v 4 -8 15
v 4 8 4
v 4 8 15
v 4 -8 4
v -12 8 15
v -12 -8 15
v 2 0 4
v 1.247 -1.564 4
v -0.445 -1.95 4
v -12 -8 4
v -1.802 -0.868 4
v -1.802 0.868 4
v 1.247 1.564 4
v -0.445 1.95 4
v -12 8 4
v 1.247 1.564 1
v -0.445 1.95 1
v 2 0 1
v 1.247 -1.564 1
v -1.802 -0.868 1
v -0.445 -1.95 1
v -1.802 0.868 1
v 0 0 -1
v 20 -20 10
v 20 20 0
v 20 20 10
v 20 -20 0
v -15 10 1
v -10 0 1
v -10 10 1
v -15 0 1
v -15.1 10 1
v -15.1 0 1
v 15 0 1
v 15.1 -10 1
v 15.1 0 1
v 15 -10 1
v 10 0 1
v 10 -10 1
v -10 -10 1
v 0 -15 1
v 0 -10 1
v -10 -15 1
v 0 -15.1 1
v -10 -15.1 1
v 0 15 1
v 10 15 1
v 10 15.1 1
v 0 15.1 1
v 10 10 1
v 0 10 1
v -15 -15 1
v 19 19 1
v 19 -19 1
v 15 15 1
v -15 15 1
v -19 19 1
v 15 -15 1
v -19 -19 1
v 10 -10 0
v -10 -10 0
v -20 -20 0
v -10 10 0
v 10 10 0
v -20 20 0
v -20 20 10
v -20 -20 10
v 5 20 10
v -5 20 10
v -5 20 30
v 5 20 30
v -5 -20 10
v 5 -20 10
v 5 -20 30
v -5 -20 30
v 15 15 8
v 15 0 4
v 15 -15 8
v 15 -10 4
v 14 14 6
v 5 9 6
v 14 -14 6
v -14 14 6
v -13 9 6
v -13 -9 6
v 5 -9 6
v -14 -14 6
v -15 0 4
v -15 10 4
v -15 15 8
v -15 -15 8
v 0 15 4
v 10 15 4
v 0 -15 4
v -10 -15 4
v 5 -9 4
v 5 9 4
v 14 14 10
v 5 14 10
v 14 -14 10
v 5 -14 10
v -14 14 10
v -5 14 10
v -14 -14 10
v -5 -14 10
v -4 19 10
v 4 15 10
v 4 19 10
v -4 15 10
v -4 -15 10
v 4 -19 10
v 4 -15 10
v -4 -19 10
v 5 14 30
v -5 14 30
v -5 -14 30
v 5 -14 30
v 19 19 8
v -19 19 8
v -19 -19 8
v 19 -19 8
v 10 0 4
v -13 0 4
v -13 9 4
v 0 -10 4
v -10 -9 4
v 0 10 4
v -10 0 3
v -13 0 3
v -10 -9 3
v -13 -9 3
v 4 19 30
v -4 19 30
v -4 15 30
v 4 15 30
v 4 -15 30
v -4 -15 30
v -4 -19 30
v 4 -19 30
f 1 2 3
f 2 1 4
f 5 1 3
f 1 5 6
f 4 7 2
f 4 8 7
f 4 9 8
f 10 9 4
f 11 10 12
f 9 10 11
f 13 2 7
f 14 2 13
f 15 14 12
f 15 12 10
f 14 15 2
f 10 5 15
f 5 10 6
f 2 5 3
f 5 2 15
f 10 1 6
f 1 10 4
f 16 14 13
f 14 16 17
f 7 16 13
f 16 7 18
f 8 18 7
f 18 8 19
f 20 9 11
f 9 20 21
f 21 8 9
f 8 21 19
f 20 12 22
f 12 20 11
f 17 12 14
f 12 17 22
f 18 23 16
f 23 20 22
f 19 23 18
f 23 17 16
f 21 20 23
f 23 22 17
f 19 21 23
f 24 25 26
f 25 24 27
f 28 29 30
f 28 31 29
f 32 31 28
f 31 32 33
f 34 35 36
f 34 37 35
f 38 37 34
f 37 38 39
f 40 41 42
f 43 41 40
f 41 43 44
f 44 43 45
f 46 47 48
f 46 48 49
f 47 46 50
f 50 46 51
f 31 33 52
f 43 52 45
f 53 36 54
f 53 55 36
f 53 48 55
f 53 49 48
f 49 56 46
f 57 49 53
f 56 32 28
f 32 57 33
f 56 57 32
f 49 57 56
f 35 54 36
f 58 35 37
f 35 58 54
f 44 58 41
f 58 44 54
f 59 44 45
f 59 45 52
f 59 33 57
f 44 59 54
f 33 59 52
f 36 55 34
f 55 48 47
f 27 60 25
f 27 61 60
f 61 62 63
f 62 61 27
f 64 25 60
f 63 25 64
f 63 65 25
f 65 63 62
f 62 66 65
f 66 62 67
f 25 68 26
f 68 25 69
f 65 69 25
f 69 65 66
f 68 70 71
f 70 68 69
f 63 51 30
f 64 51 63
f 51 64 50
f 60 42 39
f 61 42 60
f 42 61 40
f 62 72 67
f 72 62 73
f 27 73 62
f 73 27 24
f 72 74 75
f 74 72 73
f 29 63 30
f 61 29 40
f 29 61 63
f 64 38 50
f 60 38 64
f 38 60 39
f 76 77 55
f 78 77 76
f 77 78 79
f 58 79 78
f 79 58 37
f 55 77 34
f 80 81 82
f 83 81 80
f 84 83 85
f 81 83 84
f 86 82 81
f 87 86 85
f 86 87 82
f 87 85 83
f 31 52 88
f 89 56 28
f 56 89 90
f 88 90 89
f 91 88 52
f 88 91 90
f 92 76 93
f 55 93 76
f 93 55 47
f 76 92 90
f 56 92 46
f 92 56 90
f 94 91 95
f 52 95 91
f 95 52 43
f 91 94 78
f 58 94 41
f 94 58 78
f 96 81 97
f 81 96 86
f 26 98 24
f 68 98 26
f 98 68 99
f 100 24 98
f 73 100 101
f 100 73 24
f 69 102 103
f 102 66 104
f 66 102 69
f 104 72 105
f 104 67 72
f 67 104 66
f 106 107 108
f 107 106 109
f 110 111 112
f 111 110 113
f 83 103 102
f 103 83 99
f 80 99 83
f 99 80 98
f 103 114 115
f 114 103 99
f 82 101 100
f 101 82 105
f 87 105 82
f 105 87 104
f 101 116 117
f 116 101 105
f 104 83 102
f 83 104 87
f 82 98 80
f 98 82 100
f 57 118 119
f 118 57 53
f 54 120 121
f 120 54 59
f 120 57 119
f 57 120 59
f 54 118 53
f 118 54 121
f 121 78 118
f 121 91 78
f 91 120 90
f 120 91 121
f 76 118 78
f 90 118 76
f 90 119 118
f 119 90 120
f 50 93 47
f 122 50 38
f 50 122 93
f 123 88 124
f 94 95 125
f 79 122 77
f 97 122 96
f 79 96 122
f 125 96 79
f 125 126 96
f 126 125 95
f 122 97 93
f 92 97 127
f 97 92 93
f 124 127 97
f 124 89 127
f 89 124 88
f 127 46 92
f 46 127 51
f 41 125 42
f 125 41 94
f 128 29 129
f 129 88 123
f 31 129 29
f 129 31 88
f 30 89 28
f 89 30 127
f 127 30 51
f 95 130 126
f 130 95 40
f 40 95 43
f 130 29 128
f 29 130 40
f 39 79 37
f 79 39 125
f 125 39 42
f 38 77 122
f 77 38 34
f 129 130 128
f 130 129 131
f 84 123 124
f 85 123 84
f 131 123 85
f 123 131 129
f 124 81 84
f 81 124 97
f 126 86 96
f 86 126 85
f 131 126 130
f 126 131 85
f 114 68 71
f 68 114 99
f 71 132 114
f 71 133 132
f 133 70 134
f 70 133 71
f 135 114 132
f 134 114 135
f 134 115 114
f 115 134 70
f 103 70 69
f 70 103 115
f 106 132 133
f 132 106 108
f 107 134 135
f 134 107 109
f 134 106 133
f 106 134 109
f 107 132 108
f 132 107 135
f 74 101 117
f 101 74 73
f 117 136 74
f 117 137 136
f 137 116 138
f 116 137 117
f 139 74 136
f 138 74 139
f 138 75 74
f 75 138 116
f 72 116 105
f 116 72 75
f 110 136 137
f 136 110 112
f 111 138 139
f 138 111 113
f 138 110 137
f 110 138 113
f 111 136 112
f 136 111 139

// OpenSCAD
//linear_extrude(80, twist=180,scale=[3,3]) translate([20,0,0]) 

//translate([-1000,0]) linear_extrude(3,  twist=1 ,scale=([1,1]),$fn=1000) translate([1000,0]) difference()
//{
//square([12,12]);
//translate([2,2]) square([8,8]);
//}
    ;
//cube([10,10,10]);
module extruder(){
    dz=4;
    translate([-8-4,-8,dz]) cube([16,16,11]);
    translate([0,0,-3+dz]) cylinder(3,2,2);
    translate([0,0,-5+dz]) cylinder(2,0,2);
}

module extruderSpace(){
    dz=3;
    translate([-9-4,-9,dz]) cube([18,18,11]);
}


module tube(h,r1,r2)
{
    difference(){
        cylinder(h,r2,r2);
        translate([0,0,-0.1]) cylinder(h+0.2,r1,r1);
    }
}

module box(x,y,z,w,down,up) {
    if (down) {
        translate([-x/2,-y/2,0]) cube([x,y,w]);
    }
    if (up){
        translate([-x/2,-y/2,z-w]) cube([x,y,w]);
    }
    translate([-x/2,y/2-w,0]) cube([x,w,z]);
    translate([-x/2,-y/2,0]) cube([x,w,z]);
    
    translate([-x/2,-y/2,0]) cube([ w,y,z]);
    translate([ x/2-w,-y/2,0]) cube([w,y,z]);
}
extruder();

module coller(){
    difference(){
        union(){
            box(40,40,1,10,0,0); // base
            translate([0,0,1]) box(30,30,5,10,0,0); // wind roof
            box(30,30,10,1,0,0); // inner walls
            box(40,40,10,1,0,0); // outer walls
            translate([0,0,8]) box(40,40,2,5,0,0); //outer roof
        }
        extruderSpace();
        
        for(i=[0:90:360]){
            #rotate([0,0,i]) translate([0,0,1]) cube([10,15.1,3]);
        }
        
        
    }
}

intersection(){
coller();
//#tube(20,24,25);
}

translate([0,17,10]) box(10,6,20,1,0,0);
translate([0,-17,10]) box(10,6,20,1,0,0);
//#translate([0,17,27]) box(10+1,6+1,10,1,0,0);
//#translate([0,-17,27]) box(10+1,6+1,10,1,0,0);

//translate([-15,0,9]) rotate([0,60,0]) translate([-30,-20,0]) cube([30,40,1]);

//translate([0,0,1]) box(30,30,5,7,0,0);
for(i=[0:90:360]){
    //rotate([0,0,i]) translate([-2,10,0]) cube([1,5,3]);
}

//translate([-7,-14,0]) box(4,3,2,7,0,0);
//box



//tube(12,15,16);
//tube(1,12,16);
//cube([16,1,10]);
